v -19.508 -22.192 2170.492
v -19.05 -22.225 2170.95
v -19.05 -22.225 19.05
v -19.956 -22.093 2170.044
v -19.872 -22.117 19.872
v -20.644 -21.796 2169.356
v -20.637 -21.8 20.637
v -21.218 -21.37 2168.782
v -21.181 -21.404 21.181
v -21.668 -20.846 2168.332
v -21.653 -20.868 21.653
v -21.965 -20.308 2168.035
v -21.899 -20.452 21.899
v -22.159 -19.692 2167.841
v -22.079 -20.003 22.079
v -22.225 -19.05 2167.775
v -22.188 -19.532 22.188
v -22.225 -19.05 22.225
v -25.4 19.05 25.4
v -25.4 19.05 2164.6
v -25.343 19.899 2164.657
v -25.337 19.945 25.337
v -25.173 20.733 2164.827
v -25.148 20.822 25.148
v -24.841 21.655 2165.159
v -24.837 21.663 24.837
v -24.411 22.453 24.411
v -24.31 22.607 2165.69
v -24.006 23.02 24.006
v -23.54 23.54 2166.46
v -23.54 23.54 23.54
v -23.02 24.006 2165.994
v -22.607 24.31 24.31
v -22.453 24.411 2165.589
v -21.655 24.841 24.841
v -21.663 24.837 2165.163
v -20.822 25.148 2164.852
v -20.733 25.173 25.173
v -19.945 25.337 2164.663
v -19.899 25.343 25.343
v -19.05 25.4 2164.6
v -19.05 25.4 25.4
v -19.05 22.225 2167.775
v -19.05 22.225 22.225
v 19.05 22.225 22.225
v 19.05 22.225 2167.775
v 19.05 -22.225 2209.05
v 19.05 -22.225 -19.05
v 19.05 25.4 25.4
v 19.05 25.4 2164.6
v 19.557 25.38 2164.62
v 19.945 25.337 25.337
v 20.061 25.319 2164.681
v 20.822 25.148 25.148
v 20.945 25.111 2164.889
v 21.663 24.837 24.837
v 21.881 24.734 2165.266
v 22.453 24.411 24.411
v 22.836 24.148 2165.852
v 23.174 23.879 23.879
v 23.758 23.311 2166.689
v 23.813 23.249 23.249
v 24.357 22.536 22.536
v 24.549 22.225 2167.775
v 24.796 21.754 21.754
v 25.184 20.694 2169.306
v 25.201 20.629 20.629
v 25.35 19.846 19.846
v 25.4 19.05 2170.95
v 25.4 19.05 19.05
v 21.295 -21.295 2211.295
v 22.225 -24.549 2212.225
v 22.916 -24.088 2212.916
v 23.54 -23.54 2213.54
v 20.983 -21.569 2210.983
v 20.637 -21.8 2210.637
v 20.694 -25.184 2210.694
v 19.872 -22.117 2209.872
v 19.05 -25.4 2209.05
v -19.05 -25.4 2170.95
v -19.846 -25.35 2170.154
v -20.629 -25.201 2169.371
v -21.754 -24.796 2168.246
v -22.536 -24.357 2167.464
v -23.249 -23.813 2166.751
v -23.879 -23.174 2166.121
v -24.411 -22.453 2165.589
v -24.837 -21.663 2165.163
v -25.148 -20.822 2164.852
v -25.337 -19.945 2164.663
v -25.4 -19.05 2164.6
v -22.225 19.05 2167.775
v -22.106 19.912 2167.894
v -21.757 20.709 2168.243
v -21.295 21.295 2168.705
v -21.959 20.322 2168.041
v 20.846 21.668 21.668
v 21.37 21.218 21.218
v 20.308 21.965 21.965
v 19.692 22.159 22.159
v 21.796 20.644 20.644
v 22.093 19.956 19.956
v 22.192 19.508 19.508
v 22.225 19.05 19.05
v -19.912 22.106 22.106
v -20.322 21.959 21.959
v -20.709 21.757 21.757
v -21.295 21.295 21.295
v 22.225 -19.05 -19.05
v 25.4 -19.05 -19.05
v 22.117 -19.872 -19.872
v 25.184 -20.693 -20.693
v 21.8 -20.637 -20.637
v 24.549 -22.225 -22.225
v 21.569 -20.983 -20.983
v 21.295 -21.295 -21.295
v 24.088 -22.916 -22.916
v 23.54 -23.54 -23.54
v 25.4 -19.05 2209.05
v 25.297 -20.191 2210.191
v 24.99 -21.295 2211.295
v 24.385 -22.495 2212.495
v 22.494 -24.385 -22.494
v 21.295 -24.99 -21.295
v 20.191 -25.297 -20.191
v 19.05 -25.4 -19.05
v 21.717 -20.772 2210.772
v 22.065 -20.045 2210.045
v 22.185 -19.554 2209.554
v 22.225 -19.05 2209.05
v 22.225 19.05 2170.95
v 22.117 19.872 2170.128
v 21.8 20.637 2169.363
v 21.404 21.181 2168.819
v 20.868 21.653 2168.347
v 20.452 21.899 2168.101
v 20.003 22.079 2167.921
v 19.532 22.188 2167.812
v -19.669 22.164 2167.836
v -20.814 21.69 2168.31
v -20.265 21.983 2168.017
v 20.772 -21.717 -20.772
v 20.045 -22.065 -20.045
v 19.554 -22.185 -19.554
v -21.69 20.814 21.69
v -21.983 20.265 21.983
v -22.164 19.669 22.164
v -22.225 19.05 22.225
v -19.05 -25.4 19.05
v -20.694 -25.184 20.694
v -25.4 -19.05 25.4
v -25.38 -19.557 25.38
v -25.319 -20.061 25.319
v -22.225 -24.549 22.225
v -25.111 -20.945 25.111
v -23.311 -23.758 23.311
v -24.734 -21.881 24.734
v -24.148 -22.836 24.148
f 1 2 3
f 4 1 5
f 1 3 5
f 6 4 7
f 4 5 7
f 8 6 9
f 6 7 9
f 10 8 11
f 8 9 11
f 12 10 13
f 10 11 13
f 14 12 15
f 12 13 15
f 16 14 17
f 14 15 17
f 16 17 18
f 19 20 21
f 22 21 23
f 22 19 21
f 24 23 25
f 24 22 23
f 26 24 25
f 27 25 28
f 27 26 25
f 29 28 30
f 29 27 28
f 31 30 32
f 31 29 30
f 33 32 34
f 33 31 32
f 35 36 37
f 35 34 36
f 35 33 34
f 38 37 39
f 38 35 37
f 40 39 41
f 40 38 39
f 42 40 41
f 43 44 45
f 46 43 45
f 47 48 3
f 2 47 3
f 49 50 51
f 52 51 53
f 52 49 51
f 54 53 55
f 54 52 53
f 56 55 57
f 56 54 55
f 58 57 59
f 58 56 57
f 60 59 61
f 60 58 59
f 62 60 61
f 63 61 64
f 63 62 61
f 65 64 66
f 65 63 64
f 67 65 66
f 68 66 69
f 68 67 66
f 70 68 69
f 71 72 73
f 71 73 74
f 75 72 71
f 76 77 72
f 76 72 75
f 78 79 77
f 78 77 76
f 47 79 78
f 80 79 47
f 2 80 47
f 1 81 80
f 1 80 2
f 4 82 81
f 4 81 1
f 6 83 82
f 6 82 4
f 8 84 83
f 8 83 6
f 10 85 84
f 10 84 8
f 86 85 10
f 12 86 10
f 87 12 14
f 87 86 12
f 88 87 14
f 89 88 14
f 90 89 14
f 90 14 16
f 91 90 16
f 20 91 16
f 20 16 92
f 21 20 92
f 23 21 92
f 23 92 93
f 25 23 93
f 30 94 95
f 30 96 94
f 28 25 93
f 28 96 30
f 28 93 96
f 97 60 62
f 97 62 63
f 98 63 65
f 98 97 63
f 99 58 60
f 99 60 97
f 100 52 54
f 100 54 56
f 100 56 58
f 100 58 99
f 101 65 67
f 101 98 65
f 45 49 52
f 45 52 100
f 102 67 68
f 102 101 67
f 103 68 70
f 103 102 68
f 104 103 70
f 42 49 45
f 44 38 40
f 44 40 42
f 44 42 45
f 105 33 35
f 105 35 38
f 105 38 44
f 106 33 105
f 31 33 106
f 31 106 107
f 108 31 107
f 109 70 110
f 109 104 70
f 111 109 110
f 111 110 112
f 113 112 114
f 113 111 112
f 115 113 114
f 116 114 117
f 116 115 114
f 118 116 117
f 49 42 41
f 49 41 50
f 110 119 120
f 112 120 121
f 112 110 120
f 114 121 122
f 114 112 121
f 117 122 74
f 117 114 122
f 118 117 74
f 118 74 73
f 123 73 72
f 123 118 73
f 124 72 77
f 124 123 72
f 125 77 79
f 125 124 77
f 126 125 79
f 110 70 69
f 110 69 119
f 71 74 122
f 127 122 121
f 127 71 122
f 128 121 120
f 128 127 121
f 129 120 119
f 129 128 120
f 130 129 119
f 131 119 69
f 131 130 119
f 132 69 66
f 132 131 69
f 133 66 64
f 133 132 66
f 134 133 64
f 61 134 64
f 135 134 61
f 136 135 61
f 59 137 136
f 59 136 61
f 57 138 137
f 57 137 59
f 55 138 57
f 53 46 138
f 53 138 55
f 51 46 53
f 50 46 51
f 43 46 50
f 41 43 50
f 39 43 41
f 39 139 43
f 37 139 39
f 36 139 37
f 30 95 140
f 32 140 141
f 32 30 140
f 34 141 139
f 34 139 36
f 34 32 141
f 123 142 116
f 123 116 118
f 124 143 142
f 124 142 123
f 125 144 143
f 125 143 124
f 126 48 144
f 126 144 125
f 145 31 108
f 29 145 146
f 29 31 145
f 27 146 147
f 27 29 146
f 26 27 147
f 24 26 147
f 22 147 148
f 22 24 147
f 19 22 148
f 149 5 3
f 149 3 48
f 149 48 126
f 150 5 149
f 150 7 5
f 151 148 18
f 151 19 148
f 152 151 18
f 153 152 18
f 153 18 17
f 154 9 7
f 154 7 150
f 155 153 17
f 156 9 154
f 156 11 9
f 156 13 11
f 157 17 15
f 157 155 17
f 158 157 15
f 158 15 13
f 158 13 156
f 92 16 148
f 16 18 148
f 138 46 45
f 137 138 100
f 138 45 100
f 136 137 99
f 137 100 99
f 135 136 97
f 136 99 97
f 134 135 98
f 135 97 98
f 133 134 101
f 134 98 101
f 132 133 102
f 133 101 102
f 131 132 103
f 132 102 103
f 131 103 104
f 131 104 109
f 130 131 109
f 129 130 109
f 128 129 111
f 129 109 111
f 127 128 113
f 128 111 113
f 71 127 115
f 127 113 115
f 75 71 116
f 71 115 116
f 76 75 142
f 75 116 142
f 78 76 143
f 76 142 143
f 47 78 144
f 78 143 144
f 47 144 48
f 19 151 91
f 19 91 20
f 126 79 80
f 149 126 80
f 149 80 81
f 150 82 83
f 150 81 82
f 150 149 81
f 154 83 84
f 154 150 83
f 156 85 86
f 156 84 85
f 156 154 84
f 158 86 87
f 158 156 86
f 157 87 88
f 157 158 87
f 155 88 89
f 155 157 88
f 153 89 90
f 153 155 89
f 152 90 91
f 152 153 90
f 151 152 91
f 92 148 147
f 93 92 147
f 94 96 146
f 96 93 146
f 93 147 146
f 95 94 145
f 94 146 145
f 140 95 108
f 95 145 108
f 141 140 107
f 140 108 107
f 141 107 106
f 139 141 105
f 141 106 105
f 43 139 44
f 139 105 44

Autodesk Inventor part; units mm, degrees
ref_plane "Plano inicial" through (0, 0, -23.5401) normal (0, 0, 1) x (1, 0, 0)
ref_plane "Plano final" through (0, 0, 2213.5401) normal (0, 0, 1) x (1, 0, 0)
sketch "Boceto" plane through (0, 0, 0) normal (0, 0, 1) x (1, 0, 0)
  line L0 (-25.4, -19.05) -> (-25.4, 19.05)
  line L1 (-19.05, 25.4) -> (19.05, 25.4)
  line L2 (25.4, 19.05) -> (25.4, -19.05)
  line L3 (19.05, -25.4) -> (-19.05, -25.4)
  arc A0 (-25.4, -19.05) -> (-19.05, -25.4) centre (-19.05, -19.05) ccw
  arc A1 (-19.05, 25.4) -> (-25.4, 19.05) centre (-19.05, 19.05) ccw
  arc A2 (25.4, 19.05) -> (19.05, 25.4) centre (19.05, 19.05) ccw
  arc A3 (19.05, -25.4) -> (25.4, -19.05) centre (19.05, -19.05) ccw
  arc A4 (-19.05, 22.225) -> (-22.225, 19.05) centre (-19.05, 19.05) ccw
  line L4 (-19.05, 22.225) -> (19.05, 22.225)
  arc A5 (22.225, 19.05) -> (19.05, 22.225) centre (19.05, 19.05) ccw
  line L5 (22.225, 19.05) -> (22.225, -19.05)
  arc A6 (19.05, -22.225) -> (22.225, -19.05) centre (19.05, -19.05) ccw
  line L6 (19.05, -22.225) -> (-19.05, -22.225)
  arc A7 (-22.225, -19.05) -> (-19.05, -22.225) centre (-19.05, -19.05) ccw
  line L7 (-22.225, -19.05) -> (-22.225, 19.05)
  line L8 (0, 37.4012) -> (0, -37.4012) construction
  line L9 (-37.4012, 0) -> (37.4012, 0) construction
  dimension "d10" = 50.8
  dimension "d11" = 50.8
  dimension "d12" = 3.175
  dimension "d15" = 25.4
  dimension "d16" = 25.4
  dimension "d17" = 6.35
extrude "Cuerpo" add sketch "Boceto" along normal up to surface (2237.0803 mm away) from surface at -23.5401
sketch "Sketch3" plane through (0, 0, 0) normal (0, 0, 1) x (1, 0, 0)
  line L0 (0, 0) -> (10, 0)
ref_plane "Work Plane3" through (0, 0, 0) normal (0, -1, 0) x (1, 0, 0)
ref_plane "Plano de trabajo4" through (25.4, 0, -25.4) normal (-0.7071, 0, -0.7071) x (-0.7071, 0, 0.7071)
split "Dividir1" plane through (25.4, 0, -25.4) removes the side toward (-0.7071, 0, -0.7071)
ref_plane "Plano de trabajo5" through (0, -25.4, -25.4) normal (0, 0.7071, -0.7071) x (1, 0, 0)
split "Dividir2" plane through (0, -25.4, -25.4) removes the side toward (0, 0.7071, -0.7071)
ref_plane "Plano de trabajo6" through (25.4, 0, 2215.4) normal (-0.7071, 0, 0.7071) x (0.7071, 0, 0.7071)
split "Dividir3" plane through (25.4, 0, 2215.4) removes the side toward (-0.7071, 0, 0.7071)
ref_plane "Plano de trabajo7" through (0, -25.4, 2215.4) normal (0, 0.7071, 0.7071) x (1, 0, 0)
split "Dividir4" plane through (0, -25.4, 2215.4) removes the side toward (0, 0.7071, 0.7071)
sketch "Sketch4" plane through (0, 0, 0) normal (0, -1, 0) x (1, 0, 0)
  line L0 (-2, -23.5401) -> (12, -23.5401) projected
  line L1 (-2, 2213.5401) -> (12, 2213.5401) projected
  dimension "d19" = 2237.0803
equation "\"d10\" = G_H"
equation "\"d11\" = G_W"
equation "\"d12\" = G_T"
equation "\"d15\" = 0.5 * d10"
equation "\"d16\" = 0.5 * d11"
equation "\"d17\" = G_IR"
equation "\"d3\" = G_L"
equation "\"G_W\" = 50.8"
equation "\"G_H\" = 50.8"
equation "\"G_T\" = 3.175"
equation "\"G_IR\" = 6.35"
equation "\"G_L\" = d19"
equation "\"G_OFFSET_START\" = 23.54013"
equation "\"G_OFFSET_END\" = 23.54013"
equation "\"d13\" = -G_OFFSET_START"
equation "\"d14\" = G_OFFSET_END + B_L"
equation "\"B_L\" = 2190"
properties part number "AISC - 2 x 2 x 1/8 - 88,074" material "Acero, suave"
